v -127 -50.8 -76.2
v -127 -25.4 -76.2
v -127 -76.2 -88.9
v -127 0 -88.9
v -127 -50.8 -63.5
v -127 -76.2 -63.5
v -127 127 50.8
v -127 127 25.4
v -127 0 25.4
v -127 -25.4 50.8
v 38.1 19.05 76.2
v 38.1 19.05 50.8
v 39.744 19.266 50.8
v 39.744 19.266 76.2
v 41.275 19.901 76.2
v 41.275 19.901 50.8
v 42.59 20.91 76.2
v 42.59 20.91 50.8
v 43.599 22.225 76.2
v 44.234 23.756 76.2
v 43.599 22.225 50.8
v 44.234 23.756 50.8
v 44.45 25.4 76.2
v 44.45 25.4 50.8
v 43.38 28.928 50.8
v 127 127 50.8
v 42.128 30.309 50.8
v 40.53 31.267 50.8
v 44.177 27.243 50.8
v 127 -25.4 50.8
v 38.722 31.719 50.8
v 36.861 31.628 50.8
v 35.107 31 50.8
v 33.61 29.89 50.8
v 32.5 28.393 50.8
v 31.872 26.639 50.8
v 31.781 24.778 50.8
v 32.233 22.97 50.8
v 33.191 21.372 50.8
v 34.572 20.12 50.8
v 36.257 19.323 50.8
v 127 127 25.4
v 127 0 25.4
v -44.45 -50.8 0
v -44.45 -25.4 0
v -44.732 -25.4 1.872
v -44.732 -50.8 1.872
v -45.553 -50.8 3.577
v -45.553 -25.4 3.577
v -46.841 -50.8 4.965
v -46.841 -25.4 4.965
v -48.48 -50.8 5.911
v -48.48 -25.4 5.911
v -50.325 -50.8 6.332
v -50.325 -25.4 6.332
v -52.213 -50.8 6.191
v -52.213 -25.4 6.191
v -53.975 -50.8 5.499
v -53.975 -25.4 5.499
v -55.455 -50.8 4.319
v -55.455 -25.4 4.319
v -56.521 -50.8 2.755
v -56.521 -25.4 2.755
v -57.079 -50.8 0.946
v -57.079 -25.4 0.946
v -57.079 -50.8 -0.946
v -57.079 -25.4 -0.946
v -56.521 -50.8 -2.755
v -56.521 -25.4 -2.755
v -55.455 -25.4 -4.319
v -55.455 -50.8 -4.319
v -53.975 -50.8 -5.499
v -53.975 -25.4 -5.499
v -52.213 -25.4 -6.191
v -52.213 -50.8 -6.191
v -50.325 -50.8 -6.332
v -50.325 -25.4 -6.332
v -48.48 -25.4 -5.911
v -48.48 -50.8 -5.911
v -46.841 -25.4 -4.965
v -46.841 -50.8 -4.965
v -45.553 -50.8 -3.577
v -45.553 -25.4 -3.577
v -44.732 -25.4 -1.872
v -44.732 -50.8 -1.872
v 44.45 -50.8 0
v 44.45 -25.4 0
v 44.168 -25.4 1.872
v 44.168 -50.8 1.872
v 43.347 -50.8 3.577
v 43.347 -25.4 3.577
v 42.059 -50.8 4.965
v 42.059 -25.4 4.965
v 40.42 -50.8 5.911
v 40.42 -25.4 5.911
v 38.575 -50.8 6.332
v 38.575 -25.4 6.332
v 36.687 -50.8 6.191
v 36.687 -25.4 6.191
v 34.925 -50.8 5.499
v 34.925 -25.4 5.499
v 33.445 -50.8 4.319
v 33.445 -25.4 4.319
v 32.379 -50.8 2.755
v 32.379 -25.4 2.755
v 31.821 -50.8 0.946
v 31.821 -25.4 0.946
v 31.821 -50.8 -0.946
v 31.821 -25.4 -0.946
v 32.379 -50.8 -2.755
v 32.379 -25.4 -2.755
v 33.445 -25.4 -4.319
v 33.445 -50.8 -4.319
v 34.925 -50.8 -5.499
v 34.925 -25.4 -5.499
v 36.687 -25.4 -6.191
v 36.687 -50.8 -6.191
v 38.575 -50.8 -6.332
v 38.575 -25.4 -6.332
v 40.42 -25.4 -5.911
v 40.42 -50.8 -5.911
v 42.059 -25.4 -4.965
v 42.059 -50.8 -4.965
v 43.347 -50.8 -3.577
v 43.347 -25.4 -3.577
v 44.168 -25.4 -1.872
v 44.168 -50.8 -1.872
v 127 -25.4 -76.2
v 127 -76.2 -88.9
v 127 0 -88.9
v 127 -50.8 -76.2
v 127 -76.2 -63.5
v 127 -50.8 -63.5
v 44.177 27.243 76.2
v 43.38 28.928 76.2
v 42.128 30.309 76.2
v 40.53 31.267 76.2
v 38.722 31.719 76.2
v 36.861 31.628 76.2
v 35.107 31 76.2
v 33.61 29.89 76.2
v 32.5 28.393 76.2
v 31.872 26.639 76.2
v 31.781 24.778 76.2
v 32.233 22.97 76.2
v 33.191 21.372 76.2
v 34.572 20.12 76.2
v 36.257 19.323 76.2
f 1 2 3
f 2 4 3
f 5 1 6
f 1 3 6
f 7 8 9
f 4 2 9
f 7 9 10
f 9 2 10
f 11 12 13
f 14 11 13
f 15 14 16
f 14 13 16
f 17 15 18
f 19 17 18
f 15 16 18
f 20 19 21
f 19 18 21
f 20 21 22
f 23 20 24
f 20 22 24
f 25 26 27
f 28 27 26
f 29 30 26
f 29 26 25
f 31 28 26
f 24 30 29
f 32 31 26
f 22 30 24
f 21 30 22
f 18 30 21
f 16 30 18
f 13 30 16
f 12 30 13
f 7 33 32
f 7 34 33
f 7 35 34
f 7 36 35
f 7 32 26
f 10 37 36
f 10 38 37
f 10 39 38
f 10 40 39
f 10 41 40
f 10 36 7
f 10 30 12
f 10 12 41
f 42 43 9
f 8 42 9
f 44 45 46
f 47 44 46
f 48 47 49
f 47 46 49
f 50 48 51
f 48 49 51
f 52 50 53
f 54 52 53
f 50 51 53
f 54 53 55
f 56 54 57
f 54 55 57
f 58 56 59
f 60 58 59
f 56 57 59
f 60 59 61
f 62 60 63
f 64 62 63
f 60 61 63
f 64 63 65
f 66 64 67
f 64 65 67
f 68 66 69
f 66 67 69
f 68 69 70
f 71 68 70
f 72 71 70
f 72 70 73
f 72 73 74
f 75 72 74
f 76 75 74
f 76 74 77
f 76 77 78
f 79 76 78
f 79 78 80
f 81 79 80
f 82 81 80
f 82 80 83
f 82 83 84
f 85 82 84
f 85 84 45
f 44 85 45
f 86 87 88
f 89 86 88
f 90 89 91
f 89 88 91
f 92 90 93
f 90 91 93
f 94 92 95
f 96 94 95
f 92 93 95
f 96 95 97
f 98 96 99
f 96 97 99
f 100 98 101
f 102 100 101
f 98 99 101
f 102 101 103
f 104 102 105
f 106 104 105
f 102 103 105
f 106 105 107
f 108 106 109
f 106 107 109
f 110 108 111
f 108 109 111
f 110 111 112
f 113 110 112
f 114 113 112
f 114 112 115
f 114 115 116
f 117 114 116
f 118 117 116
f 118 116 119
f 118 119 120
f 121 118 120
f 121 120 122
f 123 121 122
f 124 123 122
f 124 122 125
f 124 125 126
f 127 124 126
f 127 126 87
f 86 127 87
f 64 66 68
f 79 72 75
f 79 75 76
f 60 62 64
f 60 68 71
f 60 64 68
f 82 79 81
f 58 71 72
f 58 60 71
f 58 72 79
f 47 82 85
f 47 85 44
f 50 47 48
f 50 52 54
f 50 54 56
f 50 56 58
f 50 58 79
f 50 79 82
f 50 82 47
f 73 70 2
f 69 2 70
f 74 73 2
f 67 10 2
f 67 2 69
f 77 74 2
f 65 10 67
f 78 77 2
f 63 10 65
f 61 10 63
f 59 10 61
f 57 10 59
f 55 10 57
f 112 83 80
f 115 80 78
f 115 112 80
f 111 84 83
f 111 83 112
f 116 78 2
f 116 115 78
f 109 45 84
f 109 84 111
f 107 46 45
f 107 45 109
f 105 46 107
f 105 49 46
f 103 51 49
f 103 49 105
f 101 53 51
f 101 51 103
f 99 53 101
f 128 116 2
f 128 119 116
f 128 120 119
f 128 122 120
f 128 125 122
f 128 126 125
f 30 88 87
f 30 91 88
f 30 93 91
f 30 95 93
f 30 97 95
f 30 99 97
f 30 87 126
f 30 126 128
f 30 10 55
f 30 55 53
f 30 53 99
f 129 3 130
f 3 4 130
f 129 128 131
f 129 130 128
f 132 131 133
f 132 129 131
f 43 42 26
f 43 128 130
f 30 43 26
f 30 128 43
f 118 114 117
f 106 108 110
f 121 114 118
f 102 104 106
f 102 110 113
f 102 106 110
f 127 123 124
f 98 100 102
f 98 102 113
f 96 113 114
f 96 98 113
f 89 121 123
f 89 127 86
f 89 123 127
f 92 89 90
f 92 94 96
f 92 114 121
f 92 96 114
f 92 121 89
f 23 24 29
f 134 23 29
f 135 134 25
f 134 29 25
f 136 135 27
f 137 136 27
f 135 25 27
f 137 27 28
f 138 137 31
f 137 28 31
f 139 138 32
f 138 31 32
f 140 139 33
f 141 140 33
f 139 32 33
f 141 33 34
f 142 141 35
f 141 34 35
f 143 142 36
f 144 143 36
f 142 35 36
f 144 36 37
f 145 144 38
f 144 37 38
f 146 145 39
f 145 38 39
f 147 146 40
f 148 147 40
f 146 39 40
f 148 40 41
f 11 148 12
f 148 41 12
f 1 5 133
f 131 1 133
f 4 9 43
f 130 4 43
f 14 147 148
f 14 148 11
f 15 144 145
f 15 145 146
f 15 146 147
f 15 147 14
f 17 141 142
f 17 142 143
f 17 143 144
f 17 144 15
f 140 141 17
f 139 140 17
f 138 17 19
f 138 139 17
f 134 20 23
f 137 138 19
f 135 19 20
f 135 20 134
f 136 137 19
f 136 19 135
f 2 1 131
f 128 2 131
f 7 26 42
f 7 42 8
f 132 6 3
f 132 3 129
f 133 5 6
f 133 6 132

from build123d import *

# Parameters (mm, degrees)
F0_W      = 254
F0_H      = 152.4
F0_R      = 6.35
F1_DEPTH  = 25.4
F2_DEPTH  = 50.8
F3_W      = 254
F3_H      = 12.7
F4_DEPTH  = 25.4
F5_W      = 254
F5_H      = 25.4
F6_DEPTH  = 25.4
F7_W      = 254
F7_H      = 25.4
F8_DEPTH  = 25.4
F9_W      = 254
F9_H      = 25.4
F10_DEPTH = 127
F12_DEPTH = 25.4


with BuildPart() as f1:
    # F0 (on Front) → F1 (new body)
    with BuildSketch(Plane.XZ):
        Rectangle(F0_W, F0_H)
        with Locations((-50.8, 0)):
            Circle(F0_R, mode=Mode.SUBTRACT)
        with Locations((38.1, 0)):
            Circle(F0_R, mode=Mode.SUBTRACT)
    extrude(amount=F1_DEPTH)

    # F0 (on Front) → F2 (join)
    with BuildSketch(Plane.XZ):
        with Locations((38.1, 0)):
            Circle(F0_R)
        with Locations((-50.8, 0)):
            Circle(F0_R)
    extrude(amount=F2_DEPTH)

    # F3 (on face) → F4 (join, symmetric)
    with BuildSketch(Plane.XZ.offset(25.4)):
        with Locations((0, -82.55)):
            Rectangle(F3_W, F3_H)
    extrude(amount=F4_DEPTH, both=True)

    # F5 (on face) → F6 (join)
    with BuildSketch(Plane.XZ.offset(50.8)):
        with Locations((0, -76.2)):
            Rectangle(F5_W, F5_H)
    extrude(amount=F6_DEPTH)

    # F7 (on face) → F8 (cut)
    with BuildSketch(Plane.XY.offset(76.2)):
        with Locations((0, -12.7)):
            Rectangle(F7_W, F7_H)
    extrude(amount=-F8_DEPTH, mode=Mode.SUBTRACT)

    # F9 (on face) → F10 (join)
    with BuildSketch(Plane(origin=(0, 0, 0), x_dir=(-1, 0, 0), z_dir=(0, 1, 0))):
        with Locations((0, 38.1)):
            Rectangle(F9_W, F9_H)
    extrude(amount=F10_DEPTH)

    # F11 (on face) → F12 (join)
    with BuildSketch(Plane.XY.offset(50.8)):
        with BuildLine():
            ThreePointArc((44.45, 25.4), (33.6098719395, 29.8901280605), (38.1, 19.05))
            ThreePointArc((38.1, 19.05), (42.5901280605, 20.9098719395), (44.45, 25.4))
        make_face()
    extrude(amount=F12_DEPTH)


solid = f1.part
